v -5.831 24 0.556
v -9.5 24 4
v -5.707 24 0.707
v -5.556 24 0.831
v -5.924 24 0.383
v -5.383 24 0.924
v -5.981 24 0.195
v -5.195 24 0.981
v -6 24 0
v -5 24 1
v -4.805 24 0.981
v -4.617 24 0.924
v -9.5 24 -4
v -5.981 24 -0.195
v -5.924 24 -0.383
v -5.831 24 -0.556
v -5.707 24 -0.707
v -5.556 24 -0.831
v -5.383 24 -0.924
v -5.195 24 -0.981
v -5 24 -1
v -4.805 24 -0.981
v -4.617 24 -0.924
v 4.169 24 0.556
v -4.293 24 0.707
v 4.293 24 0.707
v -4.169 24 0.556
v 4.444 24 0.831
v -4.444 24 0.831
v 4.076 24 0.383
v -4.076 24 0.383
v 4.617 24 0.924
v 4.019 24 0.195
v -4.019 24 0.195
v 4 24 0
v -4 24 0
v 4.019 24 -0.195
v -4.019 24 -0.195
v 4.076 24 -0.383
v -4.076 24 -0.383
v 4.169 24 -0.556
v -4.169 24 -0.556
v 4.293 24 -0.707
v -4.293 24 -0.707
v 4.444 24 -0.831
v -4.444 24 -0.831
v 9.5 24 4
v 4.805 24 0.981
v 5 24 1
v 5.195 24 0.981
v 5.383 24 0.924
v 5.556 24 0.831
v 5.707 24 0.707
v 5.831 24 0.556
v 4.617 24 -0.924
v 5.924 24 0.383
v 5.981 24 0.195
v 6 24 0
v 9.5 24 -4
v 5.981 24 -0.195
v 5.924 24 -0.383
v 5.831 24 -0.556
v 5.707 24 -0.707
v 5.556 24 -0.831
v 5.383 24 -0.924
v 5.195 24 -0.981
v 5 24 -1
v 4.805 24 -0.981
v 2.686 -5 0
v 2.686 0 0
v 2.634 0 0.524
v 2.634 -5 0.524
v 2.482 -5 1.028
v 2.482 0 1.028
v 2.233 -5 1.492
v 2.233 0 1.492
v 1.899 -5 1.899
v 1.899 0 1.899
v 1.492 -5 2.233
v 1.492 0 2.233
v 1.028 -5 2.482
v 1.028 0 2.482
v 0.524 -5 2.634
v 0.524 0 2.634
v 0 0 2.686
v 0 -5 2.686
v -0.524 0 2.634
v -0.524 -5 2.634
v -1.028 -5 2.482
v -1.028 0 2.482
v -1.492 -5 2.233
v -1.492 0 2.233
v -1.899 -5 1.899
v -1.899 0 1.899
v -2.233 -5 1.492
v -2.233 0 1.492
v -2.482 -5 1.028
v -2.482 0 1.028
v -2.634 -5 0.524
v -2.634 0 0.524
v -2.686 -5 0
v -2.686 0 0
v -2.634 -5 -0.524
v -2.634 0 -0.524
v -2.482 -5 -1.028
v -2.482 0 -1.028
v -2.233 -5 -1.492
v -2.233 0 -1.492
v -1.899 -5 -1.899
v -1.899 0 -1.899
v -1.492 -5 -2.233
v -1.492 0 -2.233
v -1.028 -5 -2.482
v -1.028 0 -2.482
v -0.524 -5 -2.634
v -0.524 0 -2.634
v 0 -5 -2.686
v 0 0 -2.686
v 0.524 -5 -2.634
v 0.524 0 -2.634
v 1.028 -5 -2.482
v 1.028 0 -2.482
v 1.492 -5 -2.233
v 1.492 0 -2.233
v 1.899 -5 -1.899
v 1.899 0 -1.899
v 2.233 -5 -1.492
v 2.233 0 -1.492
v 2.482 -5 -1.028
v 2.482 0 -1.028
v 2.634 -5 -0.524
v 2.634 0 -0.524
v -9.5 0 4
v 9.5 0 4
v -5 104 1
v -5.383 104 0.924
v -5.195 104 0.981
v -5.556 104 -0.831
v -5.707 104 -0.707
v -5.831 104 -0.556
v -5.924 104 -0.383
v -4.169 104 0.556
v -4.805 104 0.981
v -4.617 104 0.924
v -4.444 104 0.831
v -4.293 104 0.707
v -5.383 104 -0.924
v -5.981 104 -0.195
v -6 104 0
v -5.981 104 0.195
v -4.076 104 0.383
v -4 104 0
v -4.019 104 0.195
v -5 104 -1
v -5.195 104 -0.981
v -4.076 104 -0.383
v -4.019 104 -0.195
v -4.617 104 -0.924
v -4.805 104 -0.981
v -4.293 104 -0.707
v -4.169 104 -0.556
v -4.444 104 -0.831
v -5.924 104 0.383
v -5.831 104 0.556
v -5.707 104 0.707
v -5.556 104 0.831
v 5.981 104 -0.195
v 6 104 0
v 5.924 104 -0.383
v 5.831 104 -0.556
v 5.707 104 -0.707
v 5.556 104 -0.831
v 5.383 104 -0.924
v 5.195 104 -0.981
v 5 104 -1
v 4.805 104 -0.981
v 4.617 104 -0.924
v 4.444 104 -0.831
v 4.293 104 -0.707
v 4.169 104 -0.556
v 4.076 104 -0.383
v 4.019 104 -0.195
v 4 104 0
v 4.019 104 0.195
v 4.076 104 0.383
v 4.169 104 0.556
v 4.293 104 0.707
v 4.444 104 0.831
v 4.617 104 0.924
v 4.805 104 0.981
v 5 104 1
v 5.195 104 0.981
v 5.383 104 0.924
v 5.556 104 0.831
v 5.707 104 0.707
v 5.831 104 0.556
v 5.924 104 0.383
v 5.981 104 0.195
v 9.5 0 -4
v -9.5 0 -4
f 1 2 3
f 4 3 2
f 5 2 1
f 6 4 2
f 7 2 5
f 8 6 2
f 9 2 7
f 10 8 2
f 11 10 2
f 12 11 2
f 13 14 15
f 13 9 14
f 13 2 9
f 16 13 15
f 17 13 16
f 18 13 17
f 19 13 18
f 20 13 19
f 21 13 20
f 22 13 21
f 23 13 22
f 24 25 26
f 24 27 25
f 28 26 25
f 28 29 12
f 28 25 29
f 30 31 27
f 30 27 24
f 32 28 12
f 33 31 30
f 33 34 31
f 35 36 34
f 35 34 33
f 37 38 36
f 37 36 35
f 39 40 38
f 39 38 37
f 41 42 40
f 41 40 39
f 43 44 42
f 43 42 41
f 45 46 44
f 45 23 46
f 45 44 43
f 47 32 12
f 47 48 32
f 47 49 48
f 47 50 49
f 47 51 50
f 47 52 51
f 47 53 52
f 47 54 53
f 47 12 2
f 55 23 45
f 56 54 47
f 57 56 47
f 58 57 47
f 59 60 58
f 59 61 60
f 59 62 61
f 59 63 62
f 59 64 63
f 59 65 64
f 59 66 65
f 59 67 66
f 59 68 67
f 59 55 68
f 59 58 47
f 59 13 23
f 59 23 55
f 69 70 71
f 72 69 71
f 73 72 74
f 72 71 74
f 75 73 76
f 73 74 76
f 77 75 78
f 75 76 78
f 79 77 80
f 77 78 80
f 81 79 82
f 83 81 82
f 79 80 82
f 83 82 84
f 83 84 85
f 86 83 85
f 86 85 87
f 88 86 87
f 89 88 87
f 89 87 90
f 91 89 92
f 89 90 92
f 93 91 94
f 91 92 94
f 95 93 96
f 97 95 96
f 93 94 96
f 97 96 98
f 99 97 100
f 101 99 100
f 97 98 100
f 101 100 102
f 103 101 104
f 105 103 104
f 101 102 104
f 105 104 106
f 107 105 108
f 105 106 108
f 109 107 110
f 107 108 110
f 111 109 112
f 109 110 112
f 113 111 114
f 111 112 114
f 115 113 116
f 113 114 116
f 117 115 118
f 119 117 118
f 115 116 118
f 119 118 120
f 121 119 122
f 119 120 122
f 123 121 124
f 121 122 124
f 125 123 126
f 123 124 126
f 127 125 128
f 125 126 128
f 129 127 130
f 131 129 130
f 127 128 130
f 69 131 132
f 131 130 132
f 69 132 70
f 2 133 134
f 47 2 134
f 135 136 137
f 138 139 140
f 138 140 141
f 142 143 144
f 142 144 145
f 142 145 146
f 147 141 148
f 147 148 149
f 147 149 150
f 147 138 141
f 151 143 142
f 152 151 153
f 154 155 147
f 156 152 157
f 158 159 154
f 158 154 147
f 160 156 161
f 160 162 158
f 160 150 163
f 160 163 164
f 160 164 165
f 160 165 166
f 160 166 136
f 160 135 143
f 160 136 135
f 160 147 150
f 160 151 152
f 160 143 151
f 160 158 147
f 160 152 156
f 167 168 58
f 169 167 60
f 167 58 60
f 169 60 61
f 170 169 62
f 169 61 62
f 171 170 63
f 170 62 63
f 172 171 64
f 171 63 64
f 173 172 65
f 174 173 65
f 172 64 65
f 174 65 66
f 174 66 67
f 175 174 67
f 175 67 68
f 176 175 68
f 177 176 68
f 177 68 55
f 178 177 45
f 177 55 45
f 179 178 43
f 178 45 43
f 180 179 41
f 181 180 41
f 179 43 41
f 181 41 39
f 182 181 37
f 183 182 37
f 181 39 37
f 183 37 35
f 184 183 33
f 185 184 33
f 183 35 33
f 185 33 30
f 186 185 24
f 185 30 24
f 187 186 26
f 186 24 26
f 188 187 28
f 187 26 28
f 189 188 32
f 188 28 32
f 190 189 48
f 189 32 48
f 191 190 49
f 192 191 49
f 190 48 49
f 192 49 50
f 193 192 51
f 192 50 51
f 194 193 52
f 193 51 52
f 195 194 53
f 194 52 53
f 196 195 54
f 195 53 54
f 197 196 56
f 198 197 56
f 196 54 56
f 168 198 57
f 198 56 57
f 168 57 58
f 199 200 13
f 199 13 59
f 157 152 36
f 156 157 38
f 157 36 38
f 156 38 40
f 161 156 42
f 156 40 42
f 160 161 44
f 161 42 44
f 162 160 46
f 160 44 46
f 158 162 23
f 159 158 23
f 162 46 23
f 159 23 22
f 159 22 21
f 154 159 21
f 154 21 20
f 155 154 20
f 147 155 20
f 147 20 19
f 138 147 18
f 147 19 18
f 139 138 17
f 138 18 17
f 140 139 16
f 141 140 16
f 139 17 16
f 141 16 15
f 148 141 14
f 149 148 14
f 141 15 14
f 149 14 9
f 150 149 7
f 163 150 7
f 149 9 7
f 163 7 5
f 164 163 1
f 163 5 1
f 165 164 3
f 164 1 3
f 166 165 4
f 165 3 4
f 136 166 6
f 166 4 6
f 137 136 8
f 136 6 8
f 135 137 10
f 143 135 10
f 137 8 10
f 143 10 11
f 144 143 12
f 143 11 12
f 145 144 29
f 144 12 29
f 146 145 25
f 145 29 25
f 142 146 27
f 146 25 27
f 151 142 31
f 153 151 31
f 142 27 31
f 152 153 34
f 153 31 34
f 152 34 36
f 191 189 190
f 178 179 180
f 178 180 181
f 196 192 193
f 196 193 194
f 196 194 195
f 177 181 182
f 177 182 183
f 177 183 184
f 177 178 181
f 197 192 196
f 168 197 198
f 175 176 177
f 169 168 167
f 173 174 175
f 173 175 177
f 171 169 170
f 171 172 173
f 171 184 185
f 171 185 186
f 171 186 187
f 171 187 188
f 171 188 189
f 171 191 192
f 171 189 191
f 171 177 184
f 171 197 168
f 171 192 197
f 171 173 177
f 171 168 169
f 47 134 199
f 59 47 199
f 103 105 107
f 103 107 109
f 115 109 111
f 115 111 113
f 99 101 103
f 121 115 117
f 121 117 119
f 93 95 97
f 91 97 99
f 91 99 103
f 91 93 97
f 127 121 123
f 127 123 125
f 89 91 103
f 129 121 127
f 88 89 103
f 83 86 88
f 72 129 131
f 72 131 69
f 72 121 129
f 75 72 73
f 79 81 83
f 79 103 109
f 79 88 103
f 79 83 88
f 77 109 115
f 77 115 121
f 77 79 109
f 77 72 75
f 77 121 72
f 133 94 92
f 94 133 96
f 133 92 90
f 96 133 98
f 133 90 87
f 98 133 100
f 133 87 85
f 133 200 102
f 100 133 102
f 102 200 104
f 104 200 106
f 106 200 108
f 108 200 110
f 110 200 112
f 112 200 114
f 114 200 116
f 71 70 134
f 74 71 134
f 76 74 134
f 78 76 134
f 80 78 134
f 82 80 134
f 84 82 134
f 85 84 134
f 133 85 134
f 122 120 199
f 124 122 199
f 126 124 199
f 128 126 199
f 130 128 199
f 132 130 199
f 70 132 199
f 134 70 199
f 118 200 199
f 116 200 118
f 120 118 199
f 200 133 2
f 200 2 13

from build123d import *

# Parameters (mm, degrees)
SKETCH_1_W      = 19
SKETCH_1_H      = 8
EXTRUDE_1_DEPTH = 24
SKETCH_2_R      = 1
EXTRUDE_2_DEPTH = 80
SKETCH_3_R      = 2.686102283
EXTRUDE_3_DEPTH = 5


with BuildPart() as part:
    # 草图1 → 凸台-拉伸1 (new body)
    with BuildSketch(Plane(origin=(0, 0, 0), x_dir=(1, 0, 0), z_dir=(0, 1, 0))):
        Rectangle(SKETCH_1_W, SKETCH_1_H)
    extrude(amount=EXTRUDE_1_DEPTH)

    # 草图2 → 凸台-拉伸2 (add)
    with BuildSketch(Plane(origin=(0, 24, 0), x_dir=(1, 0, 0), z_dir=(0, 1, 0))):
        with Locations((5, 0)):
            Circle(SKETCH_2_R)
        with Locations((-5, 0)):
            Circle(SKETCH_2_R)
    extrude(amount=EXTRUDE_2_DEPTH)

    # 草图3 → 凸台-拉伸3 (add)
    with BuildSketch(Plane.XZ):
        Circle(SKETCH_3_R)
    extrude(amount=EXTRUDE_3_DEPTH)


solid = part.part
